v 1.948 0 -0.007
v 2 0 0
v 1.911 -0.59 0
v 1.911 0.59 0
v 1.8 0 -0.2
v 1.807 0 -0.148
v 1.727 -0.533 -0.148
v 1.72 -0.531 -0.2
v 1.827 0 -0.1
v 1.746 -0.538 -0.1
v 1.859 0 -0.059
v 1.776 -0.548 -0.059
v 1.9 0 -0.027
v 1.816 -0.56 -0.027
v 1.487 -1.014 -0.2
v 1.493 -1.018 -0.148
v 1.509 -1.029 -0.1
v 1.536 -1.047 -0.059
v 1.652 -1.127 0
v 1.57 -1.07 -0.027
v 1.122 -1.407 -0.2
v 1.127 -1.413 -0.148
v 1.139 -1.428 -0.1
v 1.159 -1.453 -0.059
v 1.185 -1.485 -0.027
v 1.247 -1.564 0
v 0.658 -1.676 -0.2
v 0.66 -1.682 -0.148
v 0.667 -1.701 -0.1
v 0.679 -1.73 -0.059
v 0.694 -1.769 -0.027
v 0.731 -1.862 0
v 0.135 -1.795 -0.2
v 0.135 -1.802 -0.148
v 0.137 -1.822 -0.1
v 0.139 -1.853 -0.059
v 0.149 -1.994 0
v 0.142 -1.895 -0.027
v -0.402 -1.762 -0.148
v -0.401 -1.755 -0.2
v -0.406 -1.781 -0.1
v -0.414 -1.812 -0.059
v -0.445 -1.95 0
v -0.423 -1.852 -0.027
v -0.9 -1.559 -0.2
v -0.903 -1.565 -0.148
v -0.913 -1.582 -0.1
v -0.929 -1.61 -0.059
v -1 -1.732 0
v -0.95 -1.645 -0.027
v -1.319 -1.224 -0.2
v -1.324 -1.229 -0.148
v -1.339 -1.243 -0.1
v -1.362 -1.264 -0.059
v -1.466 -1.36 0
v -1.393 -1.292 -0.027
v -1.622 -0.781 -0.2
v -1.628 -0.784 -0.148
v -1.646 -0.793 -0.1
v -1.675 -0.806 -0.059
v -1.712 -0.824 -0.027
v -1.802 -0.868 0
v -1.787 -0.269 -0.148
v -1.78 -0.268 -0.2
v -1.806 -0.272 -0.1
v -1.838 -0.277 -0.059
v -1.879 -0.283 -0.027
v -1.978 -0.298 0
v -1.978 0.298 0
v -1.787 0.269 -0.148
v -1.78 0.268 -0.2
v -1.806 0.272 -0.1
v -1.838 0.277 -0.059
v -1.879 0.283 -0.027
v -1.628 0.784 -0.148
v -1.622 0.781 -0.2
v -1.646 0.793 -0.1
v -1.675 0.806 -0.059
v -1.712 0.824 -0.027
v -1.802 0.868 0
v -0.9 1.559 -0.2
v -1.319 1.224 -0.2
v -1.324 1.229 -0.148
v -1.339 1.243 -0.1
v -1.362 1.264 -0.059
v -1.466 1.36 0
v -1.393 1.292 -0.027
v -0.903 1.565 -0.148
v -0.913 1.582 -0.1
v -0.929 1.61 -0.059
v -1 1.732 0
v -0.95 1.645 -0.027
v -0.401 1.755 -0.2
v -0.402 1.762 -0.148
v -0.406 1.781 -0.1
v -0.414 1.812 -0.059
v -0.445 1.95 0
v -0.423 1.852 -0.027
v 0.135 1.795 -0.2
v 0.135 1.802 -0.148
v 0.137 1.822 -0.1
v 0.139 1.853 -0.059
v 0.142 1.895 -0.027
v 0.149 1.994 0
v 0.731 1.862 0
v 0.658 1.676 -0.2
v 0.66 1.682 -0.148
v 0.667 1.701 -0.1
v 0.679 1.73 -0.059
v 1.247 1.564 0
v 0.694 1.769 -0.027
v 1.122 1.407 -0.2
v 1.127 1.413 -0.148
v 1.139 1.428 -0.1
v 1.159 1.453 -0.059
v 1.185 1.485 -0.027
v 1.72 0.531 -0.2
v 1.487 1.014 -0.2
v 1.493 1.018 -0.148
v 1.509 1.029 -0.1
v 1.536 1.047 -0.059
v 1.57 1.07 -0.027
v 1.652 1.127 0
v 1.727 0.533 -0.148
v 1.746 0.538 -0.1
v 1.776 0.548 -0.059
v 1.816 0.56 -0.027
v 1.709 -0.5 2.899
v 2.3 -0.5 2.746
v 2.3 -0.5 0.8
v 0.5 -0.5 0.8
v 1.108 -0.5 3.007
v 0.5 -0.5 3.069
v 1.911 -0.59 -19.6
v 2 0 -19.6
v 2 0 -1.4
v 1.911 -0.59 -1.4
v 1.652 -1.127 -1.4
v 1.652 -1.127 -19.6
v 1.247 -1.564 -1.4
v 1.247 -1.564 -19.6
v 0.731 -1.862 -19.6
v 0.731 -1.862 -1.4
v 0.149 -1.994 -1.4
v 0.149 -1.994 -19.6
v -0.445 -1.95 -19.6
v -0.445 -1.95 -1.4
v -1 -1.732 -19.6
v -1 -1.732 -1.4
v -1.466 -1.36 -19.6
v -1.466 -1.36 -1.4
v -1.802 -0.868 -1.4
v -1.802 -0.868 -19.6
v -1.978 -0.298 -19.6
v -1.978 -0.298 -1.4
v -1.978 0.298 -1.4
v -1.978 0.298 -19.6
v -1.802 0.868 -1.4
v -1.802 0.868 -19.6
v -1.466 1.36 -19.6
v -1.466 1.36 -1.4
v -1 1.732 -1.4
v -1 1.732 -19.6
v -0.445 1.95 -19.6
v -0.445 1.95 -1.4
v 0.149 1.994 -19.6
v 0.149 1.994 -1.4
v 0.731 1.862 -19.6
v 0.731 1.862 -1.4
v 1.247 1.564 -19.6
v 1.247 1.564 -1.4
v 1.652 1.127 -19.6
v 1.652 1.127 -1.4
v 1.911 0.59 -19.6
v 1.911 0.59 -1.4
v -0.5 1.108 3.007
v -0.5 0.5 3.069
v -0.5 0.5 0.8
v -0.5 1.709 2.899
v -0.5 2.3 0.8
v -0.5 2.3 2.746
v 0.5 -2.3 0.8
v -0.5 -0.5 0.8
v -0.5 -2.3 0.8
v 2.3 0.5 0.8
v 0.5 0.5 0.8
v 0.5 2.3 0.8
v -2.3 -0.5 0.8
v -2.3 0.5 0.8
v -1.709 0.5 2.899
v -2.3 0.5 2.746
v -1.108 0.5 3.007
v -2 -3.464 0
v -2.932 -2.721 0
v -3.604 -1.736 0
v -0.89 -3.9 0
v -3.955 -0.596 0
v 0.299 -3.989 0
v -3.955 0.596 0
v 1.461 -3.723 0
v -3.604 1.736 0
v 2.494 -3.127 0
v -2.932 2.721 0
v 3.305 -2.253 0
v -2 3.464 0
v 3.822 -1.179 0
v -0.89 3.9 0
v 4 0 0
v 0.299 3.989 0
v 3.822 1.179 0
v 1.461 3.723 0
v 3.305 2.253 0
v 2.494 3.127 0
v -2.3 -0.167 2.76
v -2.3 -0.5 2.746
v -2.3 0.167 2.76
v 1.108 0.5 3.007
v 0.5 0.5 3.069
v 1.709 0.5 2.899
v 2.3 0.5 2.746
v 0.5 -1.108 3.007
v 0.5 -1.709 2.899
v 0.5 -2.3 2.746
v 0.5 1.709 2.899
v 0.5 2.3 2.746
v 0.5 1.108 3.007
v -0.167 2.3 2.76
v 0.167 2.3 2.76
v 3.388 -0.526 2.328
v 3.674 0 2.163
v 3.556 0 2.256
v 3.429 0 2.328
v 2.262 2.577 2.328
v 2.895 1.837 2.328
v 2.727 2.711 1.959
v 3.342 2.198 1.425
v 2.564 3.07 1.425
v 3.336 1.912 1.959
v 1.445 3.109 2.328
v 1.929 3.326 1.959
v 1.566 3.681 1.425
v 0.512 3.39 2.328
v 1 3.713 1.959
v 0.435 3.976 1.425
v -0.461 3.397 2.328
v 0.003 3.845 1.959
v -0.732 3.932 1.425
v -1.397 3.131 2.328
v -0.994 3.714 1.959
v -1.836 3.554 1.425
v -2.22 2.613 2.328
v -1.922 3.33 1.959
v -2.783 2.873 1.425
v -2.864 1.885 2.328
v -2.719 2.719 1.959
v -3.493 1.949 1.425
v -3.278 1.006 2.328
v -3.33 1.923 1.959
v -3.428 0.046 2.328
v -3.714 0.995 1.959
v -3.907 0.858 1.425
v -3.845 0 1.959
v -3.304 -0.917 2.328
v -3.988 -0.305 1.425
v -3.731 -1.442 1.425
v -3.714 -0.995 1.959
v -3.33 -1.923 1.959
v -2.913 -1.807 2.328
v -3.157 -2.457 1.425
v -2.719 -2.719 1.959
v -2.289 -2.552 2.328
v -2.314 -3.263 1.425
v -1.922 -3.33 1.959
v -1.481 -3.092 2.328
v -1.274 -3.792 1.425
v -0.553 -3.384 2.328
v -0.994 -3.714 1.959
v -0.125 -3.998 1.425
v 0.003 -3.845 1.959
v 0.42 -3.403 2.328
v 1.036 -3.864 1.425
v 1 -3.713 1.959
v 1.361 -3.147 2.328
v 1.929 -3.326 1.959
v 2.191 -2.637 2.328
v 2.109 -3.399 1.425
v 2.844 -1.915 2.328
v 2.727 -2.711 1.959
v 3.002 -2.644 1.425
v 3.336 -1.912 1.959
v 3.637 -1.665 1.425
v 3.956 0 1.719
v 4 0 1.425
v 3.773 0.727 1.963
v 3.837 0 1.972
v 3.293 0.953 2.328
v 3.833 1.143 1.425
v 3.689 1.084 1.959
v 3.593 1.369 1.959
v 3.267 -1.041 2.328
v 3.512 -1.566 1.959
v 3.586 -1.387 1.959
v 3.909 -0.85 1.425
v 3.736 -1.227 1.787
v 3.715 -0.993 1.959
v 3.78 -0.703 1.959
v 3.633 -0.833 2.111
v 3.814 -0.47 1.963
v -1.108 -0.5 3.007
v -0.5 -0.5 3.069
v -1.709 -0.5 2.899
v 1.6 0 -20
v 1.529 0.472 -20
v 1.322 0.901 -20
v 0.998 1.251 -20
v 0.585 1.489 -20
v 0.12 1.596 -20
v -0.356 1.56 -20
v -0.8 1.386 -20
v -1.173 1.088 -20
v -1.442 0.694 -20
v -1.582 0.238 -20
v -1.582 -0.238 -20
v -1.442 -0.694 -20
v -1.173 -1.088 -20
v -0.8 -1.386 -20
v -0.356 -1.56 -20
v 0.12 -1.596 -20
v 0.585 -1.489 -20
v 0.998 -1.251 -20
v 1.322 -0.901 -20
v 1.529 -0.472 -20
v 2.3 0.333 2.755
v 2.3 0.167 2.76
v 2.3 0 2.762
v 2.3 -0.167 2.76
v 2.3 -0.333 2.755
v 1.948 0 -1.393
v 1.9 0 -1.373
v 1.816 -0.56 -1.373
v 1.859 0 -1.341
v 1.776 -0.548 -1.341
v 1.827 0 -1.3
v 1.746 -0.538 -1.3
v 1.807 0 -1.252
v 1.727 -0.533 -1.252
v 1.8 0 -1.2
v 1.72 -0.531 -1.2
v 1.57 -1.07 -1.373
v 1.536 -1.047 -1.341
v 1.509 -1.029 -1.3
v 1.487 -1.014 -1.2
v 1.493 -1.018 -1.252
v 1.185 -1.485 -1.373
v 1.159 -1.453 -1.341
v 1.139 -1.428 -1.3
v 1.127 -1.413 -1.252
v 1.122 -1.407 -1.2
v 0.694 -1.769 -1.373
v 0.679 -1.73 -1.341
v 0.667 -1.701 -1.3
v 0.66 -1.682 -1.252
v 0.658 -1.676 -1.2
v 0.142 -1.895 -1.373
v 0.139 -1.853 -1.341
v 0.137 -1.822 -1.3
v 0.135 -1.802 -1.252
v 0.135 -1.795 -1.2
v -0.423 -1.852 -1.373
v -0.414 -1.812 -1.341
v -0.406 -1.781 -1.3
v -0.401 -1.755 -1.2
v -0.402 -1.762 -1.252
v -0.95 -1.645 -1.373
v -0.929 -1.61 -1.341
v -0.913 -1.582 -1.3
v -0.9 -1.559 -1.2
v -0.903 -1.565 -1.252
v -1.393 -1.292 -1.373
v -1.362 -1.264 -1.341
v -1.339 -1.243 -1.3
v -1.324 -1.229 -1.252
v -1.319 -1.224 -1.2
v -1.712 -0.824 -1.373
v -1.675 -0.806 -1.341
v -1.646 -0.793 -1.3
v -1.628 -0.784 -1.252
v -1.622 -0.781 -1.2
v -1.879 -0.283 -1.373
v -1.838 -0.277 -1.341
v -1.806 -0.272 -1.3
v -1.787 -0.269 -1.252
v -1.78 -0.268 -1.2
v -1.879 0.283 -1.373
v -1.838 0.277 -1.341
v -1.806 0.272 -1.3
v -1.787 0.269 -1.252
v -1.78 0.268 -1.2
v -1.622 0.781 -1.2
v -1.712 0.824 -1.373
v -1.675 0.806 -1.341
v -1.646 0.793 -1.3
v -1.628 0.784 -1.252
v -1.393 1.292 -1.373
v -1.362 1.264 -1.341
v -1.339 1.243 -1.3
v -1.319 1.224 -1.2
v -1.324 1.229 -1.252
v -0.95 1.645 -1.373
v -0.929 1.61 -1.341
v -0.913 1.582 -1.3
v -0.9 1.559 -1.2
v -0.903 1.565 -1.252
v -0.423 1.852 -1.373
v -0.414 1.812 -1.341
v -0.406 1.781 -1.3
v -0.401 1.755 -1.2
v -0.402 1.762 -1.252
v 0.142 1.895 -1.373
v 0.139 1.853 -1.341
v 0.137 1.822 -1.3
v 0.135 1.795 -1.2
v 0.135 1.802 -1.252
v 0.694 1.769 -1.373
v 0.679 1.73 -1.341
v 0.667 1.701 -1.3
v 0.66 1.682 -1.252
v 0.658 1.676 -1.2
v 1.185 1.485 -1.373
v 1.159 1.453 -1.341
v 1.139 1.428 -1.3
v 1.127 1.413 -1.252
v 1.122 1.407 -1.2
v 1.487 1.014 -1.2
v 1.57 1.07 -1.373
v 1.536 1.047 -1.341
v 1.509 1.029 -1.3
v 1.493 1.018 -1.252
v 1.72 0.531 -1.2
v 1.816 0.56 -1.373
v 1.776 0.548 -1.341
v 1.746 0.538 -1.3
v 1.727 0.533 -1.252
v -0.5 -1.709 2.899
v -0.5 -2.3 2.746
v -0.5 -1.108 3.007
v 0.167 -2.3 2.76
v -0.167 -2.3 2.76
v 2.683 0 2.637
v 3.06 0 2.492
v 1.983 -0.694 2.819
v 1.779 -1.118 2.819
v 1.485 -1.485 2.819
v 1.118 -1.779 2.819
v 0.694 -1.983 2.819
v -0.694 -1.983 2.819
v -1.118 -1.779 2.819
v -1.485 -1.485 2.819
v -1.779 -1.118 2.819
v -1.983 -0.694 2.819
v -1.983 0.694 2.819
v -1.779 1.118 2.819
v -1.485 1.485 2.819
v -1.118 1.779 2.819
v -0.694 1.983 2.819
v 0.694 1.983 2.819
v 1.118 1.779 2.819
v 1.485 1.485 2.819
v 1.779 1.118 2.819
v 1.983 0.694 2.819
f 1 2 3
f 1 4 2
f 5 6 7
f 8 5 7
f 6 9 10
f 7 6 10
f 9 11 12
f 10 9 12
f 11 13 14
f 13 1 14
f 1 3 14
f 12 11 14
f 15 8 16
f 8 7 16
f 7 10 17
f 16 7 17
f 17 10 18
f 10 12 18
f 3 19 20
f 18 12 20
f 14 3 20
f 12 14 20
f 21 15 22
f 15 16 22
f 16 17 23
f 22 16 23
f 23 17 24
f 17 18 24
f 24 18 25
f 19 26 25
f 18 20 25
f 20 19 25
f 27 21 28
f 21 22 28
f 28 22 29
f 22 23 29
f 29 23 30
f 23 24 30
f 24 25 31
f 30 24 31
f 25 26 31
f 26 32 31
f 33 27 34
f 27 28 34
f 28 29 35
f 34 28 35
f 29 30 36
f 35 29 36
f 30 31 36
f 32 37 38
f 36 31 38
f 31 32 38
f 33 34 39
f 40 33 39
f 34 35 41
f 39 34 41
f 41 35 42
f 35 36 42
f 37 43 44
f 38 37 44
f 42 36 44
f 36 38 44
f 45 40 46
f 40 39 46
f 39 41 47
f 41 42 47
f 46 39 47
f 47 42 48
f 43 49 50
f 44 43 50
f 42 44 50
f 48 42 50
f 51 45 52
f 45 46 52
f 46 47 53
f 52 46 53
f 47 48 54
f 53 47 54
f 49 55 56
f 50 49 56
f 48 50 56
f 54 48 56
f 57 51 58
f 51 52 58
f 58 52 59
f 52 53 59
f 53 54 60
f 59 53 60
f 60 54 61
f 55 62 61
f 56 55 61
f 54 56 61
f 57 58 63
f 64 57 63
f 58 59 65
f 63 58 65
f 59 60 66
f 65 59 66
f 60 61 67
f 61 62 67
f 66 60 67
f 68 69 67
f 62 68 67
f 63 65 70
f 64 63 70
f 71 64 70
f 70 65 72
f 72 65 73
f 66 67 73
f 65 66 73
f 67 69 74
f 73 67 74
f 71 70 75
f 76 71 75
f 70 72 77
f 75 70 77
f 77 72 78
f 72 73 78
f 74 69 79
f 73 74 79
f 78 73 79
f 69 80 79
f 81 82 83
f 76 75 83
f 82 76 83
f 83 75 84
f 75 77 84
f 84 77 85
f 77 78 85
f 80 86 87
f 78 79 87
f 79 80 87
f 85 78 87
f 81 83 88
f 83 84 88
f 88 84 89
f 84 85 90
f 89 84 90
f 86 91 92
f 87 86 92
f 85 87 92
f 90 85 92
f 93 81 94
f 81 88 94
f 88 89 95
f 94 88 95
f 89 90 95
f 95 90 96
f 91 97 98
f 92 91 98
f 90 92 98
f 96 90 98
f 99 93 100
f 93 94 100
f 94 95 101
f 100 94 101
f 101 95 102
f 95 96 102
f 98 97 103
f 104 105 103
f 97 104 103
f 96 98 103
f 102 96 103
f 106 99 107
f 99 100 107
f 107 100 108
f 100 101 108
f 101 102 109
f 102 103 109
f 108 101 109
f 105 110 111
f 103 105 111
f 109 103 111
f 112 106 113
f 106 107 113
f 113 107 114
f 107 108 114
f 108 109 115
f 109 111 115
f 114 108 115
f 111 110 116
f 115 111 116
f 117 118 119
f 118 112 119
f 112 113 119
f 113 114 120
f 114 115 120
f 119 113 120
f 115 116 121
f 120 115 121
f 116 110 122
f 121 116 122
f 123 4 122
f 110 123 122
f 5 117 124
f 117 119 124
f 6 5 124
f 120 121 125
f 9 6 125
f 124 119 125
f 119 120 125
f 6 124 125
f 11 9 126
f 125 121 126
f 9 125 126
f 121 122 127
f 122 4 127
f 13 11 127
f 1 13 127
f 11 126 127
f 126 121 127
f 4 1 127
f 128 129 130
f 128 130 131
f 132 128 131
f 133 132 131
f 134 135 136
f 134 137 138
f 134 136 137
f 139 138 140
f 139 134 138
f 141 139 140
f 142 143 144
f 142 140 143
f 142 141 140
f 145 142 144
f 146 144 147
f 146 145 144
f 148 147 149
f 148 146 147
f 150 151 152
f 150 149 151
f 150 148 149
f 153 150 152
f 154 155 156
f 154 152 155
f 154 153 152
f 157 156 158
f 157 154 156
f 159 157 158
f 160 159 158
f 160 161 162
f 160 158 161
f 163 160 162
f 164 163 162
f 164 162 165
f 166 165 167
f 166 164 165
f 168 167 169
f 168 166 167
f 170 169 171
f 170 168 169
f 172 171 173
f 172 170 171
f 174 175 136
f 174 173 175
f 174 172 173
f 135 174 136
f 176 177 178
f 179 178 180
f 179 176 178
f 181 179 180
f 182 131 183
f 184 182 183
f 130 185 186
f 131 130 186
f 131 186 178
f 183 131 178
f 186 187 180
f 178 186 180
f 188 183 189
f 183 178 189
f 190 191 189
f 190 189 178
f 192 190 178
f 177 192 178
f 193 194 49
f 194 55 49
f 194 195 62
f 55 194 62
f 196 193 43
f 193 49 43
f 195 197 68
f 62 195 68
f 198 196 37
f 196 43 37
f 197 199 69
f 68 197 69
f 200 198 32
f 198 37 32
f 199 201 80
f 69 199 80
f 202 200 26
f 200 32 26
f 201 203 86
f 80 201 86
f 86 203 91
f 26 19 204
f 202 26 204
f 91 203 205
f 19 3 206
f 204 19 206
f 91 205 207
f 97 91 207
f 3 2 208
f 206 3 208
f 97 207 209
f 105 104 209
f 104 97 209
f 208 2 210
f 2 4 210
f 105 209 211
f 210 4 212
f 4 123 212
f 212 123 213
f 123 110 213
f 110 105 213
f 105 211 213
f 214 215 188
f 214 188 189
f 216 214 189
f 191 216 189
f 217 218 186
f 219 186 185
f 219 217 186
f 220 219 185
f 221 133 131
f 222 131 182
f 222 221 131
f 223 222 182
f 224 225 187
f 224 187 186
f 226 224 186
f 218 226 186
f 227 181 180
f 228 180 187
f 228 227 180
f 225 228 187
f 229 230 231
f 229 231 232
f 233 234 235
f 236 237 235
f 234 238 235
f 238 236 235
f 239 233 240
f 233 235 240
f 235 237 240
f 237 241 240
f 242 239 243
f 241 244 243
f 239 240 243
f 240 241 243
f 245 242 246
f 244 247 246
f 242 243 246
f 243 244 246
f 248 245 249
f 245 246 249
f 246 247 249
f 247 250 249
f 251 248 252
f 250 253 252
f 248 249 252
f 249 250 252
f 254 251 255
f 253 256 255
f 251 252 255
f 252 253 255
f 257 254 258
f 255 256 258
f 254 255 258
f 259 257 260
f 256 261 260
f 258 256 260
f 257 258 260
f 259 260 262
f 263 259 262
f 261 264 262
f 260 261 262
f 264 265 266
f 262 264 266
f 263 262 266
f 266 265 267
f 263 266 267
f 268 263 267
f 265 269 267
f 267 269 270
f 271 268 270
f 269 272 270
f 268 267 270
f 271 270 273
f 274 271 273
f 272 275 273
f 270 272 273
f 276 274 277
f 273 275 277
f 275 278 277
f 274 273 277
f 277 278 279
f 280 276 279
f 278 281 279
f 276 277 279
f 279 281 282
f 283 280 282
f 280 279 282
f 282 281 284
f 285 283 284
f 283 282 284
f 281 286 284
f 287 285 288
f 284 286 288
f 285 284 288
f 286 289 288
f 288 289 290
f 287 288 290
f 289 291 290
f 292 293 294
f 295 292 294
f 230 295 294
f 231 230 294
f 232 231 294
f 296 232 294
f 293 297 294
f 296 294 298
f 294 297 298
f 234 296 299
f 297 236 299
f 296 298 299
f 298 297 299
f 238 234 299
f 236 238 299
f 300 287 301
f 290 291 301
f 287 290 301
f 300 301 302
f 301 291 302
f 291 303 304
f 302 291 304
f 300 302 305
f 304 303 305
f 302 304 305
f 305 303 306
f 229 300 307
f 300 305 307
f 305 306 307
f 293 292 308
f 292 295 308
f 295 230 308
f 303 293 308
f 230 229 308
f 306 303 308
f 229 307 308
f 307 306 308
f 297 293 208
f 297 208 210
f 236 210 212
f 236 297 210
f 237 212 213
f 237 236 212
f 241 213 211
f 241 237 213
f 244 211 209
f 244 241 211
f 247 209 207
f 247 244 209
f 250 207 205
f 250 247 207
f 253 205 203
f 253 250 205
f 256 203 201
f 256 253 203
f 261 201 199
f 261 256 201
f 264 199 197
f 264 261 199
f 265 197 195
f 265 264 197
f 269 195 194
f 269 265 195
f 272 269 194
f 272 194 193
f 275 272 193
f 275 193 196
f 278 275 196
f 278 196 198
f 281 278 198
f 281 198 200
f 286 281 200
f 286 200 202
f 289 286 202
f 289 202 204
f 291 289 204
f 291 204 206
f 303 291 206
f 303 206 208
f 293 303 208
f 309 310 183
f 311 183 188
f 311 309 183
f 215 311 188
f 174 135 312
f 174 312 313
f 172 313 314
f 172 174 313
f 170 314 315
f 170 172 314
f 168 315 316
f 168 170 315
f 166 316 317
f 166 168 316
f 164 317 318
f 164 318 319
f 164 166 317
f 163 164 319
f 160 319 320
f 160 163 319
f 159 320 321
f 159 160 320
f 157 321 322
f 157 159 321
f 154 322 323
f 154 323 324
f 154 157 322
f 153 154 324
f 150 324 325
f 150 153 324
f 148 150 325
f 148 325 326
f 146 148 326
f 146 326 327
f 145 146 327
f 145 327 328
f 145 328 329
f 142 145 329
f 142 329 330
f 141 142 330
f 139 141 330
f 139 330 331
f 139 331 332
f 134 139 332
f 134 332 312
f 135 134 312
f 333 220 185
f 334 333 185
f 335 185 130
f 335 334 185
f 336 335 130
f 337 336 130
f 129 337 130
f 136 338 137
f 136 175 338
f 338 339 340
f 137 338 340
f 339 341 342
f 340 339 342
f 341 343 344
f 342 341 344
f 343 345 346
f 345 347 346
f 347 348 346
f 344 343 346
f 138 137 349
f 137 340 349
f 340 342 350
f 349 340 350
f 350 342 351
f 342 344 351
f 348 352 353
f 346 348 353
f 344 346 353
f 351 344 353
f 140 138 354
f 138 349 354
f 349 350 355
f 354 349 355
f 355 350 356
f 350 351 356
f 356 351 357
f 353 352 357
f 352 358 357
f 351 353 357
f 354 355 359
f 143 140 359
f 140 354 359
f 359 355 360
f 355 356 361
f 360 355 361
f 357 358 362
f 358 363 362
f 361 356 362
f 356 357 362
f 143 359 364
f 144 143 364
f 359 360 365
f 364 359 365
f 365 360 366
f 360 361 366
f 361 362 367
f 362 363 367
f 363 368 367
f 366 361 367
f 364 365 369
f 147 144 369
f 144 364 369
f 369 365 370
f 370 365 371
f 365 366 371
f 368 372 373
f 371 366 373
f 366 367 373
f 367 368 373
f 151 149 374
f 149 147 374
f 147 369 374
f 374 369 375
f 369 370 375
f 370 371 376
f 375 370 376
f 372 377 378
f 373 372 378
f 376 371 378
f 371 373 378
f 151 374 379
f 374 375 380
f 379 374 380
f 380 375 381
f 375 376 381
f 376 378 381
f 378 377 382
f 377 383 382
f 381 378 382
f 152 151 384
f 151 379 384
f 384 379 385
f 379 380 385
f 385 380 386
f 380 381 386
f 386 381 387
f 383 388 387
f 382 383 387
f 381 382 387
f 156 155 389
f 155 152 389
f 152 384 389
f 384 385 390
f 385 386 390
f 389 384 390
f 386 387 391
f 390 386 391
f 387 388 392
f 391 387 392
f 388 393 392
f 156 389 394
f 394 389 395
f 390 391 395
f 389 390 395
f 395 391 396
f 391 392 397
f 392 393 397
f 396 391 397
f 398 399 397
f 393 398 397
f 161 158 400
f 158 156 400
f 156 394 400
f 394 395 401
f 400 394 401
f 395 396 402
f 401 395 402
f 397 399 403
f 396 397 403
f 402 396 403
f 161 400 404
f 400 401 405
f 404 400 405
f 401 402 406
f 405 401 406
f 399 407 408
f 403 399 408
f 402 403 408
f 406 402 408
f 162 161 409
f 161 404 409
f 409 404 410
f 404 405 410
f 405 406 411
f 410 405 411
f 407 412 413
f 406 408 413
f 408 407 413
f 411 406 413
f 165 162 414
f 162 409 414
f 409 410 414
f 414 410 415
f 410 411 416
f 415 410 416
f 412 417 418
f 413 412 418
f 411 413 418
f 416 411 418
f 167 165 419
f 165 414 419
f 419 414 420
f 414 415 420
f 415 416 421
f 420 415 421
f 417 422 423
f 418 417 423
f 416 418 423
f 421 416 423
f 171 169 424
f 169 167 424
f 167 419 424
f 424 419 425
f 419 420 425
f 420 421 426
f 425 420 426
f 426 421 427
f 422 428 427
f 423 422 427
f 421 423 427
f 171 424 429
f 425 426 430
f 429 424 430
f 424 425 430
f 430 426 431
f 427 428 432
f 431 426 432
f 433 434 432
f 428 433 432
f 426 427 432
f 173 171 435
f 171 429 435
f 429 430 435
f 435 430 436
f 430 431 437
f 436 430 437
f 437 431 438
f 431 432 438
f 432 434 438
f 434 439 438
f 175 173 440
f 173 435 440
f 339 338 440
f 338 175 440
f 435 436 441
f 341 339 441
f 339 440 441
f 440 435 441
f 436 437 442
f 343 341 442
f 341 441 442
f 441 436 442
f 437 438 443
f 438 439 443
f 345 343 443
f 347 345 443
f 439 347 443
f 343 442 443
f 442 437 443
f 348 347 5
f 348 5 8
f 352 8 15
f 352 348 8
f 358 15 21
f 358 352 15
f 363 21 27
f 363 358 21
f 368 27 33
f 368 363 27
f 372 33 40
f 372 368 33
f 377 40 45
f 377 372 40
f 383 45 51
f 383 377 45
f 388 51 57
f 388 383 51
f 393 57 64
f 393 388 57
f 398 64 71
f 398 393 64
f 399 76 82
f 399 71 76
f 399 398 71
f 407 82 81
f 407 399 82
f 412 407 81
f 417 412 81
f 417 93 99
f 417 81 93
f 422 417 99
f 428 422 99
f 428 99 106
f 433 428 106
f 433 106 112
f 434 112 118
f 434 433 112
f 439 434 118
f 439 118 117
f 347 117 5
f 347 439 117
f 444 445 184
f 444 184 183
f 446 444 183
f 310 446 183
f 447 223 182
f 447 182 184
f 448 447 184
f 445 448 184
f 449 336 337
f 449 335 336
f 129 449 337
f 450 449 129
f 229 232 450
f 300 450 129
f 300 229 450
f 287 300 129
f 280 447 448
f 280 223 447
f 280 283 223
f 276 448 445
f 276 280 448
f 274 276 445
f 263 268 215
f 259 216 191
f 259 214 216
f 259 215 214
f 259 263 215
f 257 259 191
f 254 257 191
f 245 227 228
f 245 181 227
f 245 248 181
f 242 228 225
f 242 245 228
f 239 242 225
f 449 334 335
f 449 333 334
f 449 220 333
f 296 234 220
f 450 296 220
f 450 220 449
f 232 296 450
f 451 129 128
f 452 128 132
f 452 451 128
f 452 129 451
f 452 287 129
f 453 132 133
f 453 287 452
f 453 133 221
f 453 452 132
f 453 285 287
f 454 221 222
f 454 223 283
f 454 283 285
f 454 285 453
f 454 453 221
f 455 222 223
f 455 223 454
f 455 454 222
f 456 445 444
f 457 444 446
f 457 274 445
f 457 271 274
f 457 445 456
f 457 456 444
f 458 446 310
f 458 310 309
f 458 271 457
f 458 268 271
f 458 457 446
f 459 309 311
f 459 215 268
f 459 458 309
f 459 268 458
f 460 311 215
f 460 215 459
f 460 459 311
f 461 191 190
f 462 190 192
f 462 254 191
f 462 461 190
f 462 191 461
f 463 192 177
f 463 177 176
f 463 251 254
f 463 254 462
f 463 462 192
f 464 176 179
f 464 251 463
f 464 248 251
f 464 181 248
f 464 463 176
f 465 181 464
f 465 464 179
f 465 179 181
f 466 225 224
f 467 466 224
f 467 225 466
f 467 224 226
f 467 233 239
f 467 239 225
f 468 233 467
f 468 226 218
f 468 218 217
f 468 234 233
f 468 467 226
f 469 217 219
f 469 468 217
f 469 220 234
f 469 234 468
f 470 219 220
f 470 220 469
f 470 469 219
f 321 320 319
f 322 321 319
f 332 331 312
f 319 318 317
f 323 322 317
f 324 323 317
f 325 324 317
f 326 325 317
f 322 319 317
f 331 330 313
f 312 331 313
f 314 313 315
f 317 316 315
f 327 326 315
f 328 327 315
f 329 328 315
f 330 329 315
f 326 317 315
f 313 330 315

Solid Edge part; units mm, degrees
sketch "Sketch1" plane through (0, 0, 0) normal (0, -1, 0) x (1, 0, 0)
  line L0 (4, 0) -> (1.8, 0)
  line L1 (1.8, 0) -> (1.8, -1.4)
  line L2 (1.8, -1.4) -> (2, -1.4)
  line L3 (2, -1.4) -> (2, -20)
  line L4 (2, -20) -> (0, -20)
  arc A0 (0, 3.1) -> (4, 2.0282) centre (0, -4.9) cw
  line L5 (4, 0) -> (4, 2.0282)
  dimension "D1" = 20
  dimension "D2" = 1.4
  dimension "D3" = 0.2
  dimension "D4" = 8
  dimension "D5" = 3.1
revolve "RevolvedProtrusion1" add sketch "Sketch1" angle 360 about axis through (0, 0, -6) along (0, 0, 1)
cosmetic_thread "Thread1" size "M4"
chamfer "Chamfer_1" distance 0.4 angle 45 1 edges at (-2, 0, -20)
fillet "Round1" radius 0.2 2 edges at (-1.8, 0, -1.4) (-1.8, 0, 0)
fillet "Round_3" radius 1 1 edges at (-4, 0, 2.0282)
sketch "Sketch2" plane through (0, 0, 3.1) normal (0, 0, 1) x (1, 0, 0)
  line L0 (-0.5, 0.5) -> (-0.5, 2.3)
  line L1 (-0.5, 2.3) -> (0.5, 2.3)
  line L2 (0.5, 2.3) -> (0.5, 0.5)
  line L3 (0.5, 0.5) -> (2.3, 0.5)
  line L4 (2.3, 0.5) -> (2.3, -0.5)
  line L5 (2.3, -0.5) -> (0.5, -0.5)
  line L6 (0.5, -0.5) -> (0.5, -2.3)
  line L7 (0.5, -2.3) -> (-0.5, -2.3)
  line L8 (-0.5, -2.3) -> (-0.5, -0.5)
  line L9 (-0.5, -0.5) -> (-2.3, -0.5)
  line L10 (-2.3, -0.5) -> (-2.3, 0.5)
  line L11 (-2.3, 0.5) -> (-0.5, 0.5)
  dimension "D1" = 4.6
  dimension "D2" = 1
extrude "ExtrudedCutout_2" cut sketch "Sketch2" against normal blind 2.3
properties material "Galvanized steel"
